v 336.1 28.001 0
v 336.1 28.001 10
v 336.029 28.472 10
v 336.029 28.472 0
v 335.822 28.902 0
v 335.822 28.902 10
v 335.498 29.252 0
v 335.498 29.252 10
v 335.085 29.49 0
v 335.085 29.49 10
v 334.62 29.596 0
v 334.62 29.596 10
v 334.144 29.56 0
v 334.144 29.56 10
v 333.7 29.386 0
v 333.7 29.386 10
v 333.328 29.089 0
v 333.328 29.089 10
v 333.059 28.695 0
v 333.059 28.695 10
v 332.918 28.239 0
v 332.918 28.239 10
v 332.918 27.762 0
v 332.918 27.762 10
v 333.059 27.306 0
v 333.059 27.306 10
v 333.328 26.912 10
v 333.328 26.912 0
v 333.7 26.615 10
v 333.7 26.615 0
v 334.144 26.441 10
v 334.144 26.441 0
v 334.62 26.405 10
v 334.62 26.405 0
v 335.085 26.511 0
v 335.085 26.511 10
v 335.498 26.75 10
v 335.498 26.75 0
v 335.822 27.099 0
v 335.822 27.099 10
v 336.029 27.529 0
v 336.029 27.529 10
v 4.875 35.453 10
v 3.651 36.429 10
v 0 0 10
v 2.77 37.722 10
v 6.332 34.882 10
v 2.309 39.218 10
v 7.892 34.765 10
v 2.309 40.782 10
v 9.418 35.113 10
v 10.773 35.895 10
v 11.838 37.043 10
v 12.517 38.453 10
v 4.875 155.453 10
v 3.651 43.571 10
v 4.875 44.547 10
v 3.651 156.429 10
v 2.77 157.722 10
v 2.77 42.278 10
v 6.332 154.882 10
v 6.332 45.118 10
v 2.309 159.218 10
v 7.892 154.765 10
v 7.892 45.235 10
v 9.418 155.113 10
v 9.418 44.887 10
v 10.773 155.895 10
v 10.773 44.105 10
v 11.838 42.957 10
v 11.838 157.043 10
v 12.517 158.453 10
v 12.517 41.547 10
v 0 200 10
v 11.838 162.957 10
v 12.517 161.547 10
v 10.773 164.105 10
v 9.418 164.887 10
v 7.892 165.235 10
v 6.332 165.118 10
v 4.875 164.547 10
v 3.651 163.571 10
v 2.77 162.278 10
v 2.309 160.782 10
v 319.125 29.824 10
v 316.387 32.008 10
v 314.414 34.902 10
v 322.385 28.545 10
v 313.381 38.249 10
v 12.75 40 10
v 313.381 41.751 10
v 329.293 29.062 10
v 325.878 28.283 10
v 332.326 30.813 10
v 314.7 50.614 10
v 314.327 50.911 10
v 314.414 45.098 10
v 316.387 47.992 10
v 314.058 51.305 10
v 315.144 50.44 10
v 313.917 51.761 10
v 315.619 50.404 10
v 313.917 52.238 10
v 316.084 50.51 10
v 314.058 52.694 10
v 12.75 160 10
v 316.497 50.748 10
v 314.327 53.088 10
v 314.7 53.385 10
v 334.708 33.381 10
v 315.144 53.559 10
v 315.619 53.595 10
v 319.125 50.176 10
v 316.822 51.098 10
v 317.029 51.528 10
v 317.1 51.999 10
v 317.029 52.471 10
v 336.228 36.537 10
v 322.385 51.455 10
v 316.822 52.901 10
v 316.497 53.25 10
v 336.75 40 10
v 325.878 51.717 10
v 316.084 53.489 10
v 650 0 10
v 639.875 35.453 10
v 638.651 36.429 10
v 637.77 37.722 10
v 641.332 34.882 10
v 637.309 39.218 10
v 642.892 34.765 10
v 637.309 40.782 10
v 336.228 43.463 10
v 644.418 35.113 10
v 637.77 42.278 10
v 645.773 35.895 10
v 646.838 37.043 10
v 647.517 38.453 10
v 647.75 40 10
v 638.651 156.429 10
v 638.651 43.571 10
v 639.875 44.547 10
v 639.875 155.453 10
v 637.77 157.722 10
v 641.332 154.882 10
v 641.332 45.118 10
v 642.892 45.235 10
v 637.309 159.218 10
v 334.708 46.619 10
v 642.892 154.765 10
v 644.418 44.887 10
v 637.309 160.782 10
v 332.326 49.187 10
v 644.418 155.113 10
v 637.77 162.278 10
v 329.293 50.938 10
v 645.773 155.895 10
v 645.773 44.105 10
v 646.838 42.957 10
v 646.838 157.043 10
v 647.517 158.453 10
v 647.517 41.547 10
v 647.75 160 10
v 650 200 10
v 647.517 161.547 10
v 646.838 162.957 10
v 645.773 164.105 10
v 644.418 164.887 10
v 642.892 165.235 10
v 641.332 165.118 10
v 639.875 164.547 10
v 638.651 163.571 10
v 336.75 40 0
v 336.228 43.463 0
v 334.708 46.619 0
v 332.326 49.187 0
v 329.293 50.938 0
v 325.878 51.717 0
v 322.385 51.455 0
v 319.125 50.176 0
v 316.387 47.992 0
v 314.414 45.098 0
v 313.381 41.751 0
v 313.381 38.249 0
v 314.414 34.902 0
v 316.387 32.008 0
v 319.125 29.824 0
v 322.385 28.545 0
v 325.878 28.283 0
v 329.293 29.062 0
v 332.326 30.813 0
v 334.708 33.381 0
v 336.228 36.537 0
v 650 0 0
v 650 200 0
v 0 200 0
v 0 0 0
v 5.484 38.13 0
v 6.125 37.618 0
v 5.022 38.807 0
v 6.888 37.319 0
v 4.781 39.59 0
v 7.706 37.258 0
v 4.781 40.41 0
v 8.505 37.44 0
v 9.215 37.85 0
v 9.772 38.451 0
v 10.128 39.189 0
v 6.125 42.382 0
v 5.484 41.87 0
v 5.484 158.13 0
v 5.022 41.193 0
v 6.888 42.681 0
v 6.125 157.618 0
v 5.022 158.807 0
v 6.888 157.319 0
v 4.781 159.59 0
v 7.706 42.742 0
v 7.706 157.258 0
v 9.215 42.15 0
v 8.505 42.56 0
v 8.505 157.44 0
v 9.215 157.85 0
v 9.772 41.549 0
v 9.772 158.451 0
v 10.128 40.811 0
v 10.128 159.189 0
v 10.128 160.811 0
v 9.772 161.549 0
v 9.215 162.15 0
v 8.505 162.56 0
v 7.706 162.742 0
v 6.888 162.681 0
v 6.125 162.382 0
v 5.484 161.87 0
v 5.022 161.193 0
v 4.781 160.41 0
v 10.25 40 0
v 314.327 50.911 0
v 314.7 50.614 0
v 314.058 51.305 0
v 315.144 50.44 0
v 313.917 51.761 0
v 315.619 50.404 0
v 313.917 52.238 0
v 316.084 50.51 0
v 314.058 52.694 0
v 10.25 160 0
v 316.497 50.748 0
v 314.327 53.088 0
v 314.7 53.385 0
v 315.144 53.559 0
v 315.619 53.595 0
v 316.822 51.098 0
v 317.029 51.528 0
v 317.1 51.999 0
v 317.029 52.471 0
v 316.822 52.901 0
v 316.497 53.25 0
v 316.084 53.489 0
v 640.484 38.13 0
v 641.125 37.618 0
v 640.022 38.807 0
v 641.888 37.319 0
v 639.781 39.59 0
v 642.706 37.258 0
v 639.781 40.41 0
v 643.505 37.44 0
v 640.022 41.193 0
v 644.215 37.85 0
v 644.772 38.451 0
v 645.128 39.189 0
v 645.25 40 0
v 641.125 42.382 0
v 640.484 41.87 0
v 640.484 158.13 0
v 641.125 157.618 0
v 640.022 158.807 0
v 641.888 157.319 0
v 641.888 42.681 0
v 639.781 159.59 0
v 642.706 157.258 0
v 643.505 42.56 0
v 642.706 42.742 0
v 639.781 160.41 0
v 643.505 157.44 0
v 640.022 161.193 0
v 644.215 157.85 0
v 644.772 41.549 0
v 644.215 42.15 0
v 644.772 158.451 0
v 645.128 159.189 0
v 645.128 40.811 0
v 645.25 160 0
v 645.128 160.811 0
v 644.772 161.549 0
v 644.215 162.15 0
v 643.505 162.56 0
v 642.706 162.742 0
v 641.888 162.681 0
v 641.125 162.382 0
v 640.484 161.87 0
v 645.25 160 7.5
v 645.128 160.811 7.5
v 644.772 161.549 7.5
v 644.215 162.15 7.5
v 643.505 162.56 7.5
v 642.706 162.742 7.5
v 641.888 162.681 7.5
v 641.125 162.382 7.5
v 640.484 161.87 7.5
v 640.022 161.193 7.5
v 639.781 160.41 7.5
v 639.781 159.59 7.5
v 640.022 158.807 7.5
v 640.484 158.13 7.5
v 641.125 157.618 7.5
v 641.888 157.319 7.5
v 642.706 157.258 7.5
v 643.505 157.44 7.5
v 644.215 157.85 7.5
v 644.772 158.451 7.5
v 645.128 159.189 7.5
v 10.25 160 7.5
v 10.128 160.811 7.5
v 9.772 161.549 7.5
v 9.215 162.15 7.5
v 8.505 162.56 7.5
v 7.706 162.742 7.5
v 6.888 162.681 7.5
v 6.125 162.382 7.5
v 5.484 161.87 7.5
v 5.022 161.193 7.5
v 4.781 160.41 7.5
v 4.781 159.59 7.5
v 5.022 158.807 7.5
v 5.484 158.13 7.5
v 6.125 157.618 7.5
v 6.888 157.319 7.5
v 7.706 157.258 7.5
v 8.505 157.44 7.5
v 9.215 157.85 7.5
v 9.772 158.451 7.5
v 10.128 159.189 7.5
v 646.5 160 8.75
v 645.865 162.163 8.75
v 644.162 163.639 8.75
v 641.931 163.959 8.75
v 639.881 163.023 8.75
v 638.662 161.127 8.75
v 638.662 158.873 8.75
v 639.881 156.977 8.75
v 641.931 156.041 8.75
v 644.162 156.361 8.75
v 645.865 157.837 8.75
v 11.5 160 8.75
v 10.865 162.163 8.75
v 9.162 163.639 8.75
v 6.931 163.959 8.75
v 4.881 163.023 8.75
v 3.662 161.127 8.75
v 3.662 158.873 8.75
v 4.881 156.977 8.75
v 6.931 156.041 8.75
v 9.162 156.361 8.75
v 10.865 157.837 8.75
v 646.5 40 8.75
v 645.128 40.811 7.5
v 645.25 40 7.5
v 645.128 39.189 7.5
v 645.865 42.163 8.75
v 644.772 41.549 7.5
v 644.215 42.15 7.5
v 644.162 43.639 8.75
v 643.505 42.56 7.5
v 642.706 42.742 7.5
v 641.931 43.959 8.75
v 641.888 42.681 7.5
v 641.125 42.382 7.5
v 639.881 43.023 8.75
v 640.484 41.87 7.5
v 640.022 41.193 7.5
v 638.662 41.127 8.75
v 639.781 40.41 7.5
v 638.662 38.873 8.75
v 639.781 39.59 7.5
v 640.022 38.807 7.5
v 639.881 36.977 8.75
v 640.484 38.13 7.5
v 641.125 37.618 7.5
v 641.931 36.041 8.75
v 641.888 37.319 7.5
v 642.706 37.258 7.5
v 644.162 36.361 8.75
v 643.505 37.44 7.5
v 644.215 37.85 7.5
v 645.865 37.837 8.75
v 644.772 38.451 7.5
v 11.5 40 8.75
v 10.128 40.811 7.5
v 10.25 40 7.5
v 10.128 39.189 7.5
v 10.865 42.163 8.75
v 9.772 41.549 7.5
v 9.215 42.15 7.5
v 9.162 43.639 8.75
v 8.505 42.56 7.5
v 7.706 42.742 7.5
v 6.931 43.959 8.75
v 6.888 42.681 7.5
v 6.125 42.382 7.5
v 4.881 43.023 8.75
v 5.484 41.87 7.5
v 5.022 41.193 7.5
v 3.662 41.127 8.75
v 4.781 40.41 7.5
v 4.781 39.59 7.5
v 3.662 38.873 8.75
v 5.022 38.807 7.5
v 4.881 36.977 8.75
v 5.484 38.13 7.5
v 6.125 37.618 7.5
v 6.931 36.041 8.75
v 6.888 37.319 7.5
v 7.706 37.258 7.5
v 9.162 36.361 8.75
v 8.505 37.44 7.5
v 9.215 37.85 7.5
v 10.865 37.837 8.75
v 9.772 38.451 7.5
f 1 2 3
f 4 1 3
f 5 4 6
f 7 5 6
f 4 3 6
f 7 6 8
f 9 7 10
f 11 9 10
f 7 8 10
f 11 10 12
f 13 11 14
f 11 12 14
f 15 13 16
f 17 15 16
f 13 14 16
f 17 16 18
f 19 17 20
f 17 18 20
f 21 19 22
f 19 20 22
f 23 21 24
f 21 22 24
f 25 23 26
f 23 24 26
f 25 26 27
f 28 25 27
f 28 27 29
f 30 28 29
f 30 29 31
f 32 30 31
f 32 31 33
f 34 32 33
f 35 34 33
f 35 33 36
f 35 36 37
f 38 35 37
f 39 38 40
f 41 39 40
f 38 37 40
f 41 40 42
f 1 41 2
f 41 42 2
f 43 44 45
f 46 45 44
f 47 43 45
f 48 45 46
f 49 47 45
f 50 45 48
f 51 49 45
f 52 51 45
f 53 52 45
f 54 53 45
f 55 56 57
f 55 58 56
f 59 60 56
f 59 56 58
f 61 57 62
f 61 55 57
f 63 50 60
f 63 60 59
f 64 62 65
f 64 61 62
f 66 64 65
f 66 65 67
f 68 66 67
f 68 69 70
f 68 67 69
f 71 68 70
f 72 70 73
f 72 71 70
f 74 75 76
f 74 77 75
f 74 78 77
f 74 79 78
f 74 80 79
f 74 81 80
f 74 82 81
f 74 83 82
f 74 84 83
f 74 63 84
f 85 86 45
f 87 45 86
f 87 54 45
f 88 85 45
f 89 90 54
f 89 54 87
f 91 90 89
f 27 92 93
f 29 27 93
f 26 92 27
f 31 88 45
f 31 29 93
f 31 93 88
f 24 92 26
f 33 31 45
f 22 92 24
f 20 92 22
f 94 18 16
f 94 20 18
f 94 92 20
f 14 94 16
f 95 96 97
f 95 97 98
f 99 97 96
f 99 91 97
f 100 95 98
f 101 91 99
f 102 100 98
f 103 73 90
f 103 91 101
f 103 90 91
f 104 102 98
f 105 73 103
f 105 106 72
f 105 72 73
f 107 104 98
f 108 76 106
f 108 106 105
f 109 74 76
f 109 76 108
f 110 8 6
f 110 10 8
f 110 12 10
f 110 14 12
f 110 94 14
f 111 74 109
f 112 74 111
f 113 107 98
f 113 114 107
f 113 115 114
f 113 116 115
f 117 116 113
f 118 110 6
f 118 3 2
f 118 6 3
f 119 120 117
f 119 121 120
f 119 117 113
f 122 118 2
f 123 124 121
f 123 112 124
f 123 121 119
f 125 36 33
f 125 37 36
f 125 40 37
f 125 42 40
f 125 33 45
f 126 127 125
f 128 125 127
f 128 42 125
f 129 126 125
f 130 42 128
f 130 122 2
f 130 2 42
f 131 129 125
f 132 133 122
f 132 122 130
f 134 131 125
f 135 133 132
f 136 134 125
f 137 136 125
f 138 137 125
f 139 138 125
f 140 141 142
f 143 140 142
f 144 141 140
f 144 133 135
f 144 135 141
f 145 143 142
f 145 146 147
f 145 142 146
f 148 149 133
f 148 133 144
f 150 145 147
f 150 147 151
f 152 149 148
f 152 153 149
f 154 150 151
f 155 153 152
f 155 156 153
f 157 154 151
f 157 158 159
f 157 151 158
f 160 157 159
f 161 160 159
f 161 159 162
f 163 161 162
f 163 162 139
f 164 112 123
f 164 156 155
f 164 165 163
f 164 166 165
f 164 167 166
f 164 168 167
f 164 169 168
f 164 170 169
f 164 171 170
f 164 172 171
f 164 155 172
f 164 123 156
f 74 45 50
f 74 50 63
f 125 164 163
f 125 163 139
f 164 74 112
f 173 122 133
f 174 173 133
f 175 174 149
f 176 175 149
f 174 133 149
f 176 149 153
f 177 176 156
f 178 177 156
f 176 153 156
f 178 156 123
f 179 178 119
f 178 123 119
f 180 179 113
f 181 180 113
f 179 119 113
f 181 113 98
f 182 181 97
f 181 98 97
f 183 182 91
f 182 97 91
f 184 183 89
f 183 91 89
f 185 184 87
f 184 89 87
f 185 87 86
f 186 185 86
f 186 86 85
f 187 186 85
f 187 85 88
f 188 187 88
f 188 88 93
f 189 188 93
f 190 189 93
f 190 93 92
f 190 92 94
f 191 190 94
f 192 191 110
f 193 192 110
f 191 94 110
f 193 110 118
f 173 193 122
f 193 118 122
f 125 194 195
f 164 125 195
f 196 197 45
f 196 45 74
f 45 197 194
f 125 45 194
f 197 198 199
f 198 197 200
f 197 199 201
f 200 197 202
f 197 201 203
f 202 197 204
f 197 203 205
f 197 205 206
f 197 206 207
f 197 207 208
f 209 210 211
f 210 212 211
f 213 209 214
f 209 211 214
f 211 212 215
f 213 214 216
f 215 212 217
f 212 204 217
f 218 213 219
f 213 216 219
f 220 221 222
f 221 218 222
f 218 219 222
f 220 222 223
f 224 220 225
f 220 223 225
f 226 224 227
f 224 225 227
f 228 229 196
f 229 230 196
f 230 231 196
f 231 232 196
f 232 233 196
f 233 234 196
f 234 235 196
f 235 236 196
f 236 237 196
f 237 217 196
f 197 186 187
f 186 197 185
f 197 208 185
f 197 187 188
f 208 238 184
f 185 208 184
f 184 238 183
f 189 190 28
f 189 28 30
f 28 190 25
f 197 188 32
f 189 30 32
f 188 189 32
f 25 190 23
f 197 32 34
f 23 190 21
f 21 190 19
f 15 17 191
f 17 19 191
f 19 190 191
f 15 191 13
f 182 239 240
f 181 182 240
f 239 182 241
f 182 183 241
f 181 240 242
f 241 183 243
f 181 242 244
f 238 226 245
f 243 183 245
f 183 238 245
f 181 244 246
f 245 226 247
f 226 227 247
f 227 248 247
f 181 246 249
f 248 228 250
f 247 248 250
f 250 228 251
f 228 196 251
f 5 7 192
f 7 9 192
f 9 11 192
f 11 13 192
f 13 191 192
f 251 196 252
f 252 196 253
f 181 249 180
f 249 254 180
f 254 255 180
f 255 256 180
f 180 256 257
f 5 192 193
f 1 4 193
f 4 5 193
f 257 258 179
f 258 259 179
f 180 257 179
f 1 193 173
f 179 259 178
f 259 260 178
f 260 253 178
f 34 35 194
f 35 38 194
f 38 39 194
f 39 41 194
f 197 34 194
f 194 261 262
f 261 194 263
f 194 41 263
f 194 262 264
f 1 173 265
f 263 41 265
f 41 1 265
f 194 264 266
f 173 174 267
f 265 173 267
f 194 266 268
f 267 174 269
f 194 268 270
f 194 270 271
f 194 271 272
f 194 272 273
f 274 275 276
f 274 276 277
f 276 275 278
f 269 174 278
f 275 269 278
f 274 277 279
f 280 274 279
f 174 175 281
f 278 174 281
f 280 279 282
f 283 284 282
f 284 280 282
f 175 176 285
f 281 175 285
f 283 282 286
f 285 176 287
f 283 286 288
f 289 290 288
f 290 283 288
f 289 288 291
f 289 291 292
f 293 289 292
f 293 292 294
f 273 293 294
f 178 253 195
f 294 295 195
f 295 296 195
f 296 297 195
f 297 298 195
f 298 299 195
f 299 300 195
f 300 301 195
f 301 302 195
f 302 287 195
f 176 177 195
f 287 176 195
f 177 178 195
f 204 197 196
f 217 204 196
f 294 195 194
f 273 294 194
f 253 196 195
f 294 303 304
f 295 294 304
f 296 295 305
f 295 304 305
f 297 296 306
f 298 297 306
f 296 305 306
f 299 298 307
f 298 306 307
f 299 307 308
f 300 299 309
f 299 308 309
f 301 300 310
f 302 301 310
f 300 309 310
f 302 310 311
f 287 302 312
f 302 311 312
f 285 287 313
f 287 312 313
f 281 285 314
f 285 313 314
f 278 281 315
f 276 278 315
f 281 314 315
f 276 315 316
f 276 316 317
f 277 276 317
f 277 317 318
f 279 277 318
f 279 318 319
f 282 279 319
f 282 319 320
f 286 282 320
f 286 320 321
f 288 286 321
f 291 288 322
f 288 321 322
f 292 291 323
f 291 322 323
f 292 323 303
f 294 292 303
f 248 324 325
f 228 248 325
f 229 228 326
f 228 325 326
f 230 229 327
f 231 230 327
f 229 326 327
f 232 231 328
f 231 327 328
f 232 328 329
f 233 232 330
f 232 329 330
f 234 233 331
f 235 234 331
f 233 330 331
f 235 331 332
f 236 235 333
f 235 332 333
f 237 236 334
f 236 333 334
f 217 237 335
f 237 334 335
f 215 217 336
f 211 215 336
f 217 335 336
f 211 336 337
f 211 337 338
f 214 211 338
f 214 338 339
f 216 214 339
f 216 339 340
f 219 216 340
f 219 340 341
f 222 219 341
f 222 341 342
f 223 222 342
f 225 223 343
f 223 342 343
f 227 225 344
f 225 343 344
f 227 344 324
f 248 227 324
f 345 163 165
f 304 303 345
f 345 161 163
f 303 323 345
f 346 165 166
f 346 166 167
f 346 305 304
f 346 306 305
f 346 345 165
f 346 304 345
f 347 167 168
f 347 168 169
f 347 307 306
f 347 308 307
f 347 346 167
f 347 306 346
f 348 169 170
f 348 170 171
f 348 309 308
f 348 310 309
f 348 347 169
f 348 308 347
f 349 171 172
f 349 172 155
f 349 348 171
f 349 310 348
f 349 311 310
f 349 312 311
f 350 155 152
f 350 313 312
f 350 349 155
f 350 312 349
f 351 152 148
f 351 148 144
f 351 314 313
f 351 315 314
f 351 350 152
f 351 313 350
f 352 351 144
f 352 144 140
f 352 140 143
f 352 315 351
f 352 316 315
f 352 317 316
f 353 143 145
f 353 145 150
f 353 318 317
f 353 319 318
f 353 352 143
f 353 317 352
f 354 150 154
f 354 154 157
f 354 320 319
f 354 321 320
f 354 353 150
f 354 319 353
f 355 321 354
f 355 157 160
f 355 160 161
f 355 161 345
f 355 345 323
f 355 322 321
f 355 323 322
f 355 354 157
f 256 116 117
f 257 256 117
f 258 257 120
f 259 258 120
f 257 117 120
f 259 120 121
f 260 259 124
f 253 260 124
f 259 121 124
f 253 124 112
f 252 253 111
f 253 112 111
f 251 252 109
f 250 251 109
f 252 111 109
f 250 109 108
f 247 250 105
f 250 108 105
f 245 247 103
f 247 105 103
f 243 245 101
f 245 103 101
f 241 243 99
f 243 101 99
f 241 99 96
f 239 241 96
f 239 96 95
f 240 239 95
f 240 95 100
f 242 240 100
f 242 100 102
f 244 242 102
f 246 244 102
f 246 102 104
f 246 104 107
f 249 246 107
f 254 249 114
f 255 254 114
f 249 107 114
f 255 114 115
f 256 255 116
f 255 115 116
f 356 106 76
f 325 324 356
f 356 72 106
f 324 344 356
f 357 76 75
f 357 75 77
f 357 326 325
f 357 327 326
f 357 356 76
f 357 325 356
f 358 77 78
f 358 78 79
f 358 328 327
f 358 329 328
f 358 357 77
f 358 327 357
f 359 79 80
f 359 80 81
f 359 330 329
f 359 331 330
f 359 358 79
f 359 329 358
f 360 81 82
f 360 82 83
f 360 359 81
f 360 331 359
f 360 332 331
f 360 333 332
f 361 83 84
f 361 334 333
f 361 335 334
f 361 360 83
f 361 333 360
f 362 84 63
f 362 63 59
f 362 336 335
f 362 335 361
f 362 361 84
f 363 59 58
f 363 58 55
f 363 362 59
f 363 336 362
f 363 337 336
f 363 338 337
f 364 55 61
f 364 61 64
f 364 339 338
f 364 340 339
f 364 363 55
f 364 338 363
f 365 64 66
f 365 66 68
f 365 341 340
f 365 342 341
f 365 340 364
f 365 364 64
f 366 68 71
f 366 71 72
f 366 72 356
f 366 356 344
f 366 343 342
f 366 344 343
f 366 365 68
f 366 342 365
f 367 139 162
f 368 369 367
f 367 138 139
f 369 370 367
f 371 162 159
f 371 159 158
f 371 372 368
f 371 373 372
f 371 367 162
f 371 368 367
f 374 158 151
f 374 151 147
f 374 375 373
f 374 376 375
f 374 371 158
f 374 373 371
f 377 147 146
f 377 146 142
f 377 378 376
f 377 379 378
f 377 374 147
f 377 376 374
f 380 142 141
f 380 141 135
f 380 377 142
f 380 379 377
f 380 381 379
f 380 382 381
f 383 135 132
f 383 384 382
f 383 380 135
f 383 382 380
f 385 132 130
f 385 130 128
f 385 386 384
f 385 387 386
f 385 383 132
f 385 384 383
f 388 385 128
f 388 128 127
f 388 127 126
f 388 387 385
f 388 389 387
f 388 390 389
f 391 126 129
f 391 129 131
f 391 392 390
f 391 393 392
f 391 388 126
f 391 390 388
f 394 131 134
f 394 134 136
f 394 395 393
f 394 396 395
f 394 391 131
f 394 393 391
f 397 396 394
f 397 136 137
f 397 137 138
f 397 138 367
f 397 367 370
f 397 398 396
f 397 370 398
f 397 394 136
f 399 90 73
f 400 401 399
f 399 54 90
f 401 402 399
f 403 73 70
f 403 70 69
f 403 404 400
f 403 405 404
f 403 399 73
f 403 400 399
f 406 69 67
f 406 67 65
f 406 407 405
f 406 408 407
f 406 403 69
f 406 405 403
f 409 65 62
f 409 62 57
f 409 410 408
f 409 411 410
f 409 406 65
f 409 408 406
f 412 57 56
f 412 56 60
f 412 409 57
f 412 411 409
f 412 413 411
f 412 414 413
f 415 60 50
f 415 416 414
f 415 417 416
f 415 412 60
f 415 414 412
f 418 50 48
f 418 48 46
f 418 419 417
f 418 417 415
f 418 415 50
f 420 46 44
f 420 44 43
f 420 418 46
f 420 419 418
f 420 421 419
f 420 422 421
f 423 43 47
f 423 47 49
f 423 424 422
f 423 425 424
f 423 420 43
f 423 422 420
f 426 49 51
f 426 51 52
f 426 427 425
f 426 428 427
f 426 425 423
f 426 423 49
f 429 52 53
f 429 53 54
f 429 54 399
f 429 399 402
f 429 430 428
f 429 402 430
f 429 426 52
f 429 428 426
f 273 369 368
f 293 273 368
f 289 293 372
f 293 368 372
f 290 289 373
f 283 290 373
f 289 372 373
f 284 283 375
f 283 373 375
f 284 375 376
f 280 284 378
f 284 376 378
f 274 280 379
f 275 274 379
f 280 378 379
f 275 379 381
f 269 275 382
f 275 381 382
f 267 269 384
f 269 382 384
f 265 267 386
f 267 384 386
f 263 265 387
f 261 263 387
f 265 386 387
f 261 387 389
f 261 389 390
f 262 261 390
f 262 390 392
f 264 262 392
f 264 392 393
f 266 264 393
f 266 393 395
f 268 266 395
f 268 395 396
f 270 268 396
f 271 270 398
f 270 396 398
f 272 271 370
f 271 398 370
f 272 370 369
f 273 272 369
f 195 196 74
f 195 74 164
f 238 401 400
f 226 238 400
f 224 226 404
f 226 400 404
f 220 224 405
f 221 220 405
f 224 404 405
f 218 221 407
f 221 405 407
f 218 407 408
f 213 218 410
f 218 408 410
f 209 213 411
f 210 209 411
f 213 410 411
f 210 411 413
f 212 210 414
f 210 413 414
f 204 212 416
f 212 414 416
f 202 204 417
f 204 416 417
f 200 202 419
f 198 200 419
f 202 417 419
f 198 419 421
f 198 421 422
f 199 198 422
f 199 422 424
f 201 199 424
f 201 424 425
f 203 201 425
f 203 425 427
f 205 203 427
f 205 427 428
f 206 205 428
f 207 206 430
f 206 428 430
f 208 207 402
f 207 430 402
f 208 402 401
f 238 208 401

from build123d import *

# Parameters (mm, degrees)
ESQUISSE1_W             = 650
ESQUISSE1_H             = 200
BOSS_EXTRU_1_DEPTH      = 10
ESQUISSE2_R             = 2.75
ENL_V_MAT_EXTRU_1_DEPTH = 10
CHANFREIN1_SIZE         = 2.5
ESQUISSE3_R             = 11.75
ESQUISSE3_R_2           = 1.6
ENL_V_MAT_EXTRU_2_DEPTH = 10


with BuildPart() as part:
    # Esquisse1 → Boss.-Extru.1 (new body)
    with BuildSketch(Plane.XY):
        with Locations((325, 100)):
            Rectangle(ESQUISSE1_W, ESQUISSE1_H)
    extrude(amount=BOSS_EXTRU_1_DEPTH)

    # Esquisse2 → Enlèv. mat.-Extru.1 (cut)
    with BuildSketch(Plane.XY.offset(10)):
        with Locations((7.5, 160)):
            Circle(ESQUISSE2_R)
        with Locations((642.5, 160)):
            Circle(ESQUISSE2_R)
        with Locations((7.5, 40)):
            Circle(ESQUISSE2_R)
        with Locations((642.5, 40)):
            Circle(ESQUISSE2_R)
    extrude(amount=-ENL_V_MAT_EXTRU_1_DEPTH, mode=Mode.SUBTRACT)

    # Chanfrein1
    chanfrein1_edges = [part.edges().sort_by_distance(p)[0] for p in [
        (4.75, 160, 10),
        (639.75, 160, 10),
        (4.75, 40, 10),
        (639.75, 40, 10),
    ]]
    chamfer(chanfrein1_edges, length=CHANFREIN1_SIZE)

    # Esquisse3 → Enlèv. mat.-Extru.2 (cut)
    with BuildSketch(Plane.XY.offset(10)):
        with Locations((325, 40)):
            Circle(ESQUISSE3_R)
        with Locations((315.499614794, 51.999404399)):
            Circle(ESQUISSE3_R_2)
        with Locations((334.500385206, 28.000595601)):
            Circle(ESQUISSE3_R_2)
    extrude(amount=-ENL_V_MAT_EXTRU_2_DEPTH, mode=Mode.SUBTRACT)


solid = part.part
